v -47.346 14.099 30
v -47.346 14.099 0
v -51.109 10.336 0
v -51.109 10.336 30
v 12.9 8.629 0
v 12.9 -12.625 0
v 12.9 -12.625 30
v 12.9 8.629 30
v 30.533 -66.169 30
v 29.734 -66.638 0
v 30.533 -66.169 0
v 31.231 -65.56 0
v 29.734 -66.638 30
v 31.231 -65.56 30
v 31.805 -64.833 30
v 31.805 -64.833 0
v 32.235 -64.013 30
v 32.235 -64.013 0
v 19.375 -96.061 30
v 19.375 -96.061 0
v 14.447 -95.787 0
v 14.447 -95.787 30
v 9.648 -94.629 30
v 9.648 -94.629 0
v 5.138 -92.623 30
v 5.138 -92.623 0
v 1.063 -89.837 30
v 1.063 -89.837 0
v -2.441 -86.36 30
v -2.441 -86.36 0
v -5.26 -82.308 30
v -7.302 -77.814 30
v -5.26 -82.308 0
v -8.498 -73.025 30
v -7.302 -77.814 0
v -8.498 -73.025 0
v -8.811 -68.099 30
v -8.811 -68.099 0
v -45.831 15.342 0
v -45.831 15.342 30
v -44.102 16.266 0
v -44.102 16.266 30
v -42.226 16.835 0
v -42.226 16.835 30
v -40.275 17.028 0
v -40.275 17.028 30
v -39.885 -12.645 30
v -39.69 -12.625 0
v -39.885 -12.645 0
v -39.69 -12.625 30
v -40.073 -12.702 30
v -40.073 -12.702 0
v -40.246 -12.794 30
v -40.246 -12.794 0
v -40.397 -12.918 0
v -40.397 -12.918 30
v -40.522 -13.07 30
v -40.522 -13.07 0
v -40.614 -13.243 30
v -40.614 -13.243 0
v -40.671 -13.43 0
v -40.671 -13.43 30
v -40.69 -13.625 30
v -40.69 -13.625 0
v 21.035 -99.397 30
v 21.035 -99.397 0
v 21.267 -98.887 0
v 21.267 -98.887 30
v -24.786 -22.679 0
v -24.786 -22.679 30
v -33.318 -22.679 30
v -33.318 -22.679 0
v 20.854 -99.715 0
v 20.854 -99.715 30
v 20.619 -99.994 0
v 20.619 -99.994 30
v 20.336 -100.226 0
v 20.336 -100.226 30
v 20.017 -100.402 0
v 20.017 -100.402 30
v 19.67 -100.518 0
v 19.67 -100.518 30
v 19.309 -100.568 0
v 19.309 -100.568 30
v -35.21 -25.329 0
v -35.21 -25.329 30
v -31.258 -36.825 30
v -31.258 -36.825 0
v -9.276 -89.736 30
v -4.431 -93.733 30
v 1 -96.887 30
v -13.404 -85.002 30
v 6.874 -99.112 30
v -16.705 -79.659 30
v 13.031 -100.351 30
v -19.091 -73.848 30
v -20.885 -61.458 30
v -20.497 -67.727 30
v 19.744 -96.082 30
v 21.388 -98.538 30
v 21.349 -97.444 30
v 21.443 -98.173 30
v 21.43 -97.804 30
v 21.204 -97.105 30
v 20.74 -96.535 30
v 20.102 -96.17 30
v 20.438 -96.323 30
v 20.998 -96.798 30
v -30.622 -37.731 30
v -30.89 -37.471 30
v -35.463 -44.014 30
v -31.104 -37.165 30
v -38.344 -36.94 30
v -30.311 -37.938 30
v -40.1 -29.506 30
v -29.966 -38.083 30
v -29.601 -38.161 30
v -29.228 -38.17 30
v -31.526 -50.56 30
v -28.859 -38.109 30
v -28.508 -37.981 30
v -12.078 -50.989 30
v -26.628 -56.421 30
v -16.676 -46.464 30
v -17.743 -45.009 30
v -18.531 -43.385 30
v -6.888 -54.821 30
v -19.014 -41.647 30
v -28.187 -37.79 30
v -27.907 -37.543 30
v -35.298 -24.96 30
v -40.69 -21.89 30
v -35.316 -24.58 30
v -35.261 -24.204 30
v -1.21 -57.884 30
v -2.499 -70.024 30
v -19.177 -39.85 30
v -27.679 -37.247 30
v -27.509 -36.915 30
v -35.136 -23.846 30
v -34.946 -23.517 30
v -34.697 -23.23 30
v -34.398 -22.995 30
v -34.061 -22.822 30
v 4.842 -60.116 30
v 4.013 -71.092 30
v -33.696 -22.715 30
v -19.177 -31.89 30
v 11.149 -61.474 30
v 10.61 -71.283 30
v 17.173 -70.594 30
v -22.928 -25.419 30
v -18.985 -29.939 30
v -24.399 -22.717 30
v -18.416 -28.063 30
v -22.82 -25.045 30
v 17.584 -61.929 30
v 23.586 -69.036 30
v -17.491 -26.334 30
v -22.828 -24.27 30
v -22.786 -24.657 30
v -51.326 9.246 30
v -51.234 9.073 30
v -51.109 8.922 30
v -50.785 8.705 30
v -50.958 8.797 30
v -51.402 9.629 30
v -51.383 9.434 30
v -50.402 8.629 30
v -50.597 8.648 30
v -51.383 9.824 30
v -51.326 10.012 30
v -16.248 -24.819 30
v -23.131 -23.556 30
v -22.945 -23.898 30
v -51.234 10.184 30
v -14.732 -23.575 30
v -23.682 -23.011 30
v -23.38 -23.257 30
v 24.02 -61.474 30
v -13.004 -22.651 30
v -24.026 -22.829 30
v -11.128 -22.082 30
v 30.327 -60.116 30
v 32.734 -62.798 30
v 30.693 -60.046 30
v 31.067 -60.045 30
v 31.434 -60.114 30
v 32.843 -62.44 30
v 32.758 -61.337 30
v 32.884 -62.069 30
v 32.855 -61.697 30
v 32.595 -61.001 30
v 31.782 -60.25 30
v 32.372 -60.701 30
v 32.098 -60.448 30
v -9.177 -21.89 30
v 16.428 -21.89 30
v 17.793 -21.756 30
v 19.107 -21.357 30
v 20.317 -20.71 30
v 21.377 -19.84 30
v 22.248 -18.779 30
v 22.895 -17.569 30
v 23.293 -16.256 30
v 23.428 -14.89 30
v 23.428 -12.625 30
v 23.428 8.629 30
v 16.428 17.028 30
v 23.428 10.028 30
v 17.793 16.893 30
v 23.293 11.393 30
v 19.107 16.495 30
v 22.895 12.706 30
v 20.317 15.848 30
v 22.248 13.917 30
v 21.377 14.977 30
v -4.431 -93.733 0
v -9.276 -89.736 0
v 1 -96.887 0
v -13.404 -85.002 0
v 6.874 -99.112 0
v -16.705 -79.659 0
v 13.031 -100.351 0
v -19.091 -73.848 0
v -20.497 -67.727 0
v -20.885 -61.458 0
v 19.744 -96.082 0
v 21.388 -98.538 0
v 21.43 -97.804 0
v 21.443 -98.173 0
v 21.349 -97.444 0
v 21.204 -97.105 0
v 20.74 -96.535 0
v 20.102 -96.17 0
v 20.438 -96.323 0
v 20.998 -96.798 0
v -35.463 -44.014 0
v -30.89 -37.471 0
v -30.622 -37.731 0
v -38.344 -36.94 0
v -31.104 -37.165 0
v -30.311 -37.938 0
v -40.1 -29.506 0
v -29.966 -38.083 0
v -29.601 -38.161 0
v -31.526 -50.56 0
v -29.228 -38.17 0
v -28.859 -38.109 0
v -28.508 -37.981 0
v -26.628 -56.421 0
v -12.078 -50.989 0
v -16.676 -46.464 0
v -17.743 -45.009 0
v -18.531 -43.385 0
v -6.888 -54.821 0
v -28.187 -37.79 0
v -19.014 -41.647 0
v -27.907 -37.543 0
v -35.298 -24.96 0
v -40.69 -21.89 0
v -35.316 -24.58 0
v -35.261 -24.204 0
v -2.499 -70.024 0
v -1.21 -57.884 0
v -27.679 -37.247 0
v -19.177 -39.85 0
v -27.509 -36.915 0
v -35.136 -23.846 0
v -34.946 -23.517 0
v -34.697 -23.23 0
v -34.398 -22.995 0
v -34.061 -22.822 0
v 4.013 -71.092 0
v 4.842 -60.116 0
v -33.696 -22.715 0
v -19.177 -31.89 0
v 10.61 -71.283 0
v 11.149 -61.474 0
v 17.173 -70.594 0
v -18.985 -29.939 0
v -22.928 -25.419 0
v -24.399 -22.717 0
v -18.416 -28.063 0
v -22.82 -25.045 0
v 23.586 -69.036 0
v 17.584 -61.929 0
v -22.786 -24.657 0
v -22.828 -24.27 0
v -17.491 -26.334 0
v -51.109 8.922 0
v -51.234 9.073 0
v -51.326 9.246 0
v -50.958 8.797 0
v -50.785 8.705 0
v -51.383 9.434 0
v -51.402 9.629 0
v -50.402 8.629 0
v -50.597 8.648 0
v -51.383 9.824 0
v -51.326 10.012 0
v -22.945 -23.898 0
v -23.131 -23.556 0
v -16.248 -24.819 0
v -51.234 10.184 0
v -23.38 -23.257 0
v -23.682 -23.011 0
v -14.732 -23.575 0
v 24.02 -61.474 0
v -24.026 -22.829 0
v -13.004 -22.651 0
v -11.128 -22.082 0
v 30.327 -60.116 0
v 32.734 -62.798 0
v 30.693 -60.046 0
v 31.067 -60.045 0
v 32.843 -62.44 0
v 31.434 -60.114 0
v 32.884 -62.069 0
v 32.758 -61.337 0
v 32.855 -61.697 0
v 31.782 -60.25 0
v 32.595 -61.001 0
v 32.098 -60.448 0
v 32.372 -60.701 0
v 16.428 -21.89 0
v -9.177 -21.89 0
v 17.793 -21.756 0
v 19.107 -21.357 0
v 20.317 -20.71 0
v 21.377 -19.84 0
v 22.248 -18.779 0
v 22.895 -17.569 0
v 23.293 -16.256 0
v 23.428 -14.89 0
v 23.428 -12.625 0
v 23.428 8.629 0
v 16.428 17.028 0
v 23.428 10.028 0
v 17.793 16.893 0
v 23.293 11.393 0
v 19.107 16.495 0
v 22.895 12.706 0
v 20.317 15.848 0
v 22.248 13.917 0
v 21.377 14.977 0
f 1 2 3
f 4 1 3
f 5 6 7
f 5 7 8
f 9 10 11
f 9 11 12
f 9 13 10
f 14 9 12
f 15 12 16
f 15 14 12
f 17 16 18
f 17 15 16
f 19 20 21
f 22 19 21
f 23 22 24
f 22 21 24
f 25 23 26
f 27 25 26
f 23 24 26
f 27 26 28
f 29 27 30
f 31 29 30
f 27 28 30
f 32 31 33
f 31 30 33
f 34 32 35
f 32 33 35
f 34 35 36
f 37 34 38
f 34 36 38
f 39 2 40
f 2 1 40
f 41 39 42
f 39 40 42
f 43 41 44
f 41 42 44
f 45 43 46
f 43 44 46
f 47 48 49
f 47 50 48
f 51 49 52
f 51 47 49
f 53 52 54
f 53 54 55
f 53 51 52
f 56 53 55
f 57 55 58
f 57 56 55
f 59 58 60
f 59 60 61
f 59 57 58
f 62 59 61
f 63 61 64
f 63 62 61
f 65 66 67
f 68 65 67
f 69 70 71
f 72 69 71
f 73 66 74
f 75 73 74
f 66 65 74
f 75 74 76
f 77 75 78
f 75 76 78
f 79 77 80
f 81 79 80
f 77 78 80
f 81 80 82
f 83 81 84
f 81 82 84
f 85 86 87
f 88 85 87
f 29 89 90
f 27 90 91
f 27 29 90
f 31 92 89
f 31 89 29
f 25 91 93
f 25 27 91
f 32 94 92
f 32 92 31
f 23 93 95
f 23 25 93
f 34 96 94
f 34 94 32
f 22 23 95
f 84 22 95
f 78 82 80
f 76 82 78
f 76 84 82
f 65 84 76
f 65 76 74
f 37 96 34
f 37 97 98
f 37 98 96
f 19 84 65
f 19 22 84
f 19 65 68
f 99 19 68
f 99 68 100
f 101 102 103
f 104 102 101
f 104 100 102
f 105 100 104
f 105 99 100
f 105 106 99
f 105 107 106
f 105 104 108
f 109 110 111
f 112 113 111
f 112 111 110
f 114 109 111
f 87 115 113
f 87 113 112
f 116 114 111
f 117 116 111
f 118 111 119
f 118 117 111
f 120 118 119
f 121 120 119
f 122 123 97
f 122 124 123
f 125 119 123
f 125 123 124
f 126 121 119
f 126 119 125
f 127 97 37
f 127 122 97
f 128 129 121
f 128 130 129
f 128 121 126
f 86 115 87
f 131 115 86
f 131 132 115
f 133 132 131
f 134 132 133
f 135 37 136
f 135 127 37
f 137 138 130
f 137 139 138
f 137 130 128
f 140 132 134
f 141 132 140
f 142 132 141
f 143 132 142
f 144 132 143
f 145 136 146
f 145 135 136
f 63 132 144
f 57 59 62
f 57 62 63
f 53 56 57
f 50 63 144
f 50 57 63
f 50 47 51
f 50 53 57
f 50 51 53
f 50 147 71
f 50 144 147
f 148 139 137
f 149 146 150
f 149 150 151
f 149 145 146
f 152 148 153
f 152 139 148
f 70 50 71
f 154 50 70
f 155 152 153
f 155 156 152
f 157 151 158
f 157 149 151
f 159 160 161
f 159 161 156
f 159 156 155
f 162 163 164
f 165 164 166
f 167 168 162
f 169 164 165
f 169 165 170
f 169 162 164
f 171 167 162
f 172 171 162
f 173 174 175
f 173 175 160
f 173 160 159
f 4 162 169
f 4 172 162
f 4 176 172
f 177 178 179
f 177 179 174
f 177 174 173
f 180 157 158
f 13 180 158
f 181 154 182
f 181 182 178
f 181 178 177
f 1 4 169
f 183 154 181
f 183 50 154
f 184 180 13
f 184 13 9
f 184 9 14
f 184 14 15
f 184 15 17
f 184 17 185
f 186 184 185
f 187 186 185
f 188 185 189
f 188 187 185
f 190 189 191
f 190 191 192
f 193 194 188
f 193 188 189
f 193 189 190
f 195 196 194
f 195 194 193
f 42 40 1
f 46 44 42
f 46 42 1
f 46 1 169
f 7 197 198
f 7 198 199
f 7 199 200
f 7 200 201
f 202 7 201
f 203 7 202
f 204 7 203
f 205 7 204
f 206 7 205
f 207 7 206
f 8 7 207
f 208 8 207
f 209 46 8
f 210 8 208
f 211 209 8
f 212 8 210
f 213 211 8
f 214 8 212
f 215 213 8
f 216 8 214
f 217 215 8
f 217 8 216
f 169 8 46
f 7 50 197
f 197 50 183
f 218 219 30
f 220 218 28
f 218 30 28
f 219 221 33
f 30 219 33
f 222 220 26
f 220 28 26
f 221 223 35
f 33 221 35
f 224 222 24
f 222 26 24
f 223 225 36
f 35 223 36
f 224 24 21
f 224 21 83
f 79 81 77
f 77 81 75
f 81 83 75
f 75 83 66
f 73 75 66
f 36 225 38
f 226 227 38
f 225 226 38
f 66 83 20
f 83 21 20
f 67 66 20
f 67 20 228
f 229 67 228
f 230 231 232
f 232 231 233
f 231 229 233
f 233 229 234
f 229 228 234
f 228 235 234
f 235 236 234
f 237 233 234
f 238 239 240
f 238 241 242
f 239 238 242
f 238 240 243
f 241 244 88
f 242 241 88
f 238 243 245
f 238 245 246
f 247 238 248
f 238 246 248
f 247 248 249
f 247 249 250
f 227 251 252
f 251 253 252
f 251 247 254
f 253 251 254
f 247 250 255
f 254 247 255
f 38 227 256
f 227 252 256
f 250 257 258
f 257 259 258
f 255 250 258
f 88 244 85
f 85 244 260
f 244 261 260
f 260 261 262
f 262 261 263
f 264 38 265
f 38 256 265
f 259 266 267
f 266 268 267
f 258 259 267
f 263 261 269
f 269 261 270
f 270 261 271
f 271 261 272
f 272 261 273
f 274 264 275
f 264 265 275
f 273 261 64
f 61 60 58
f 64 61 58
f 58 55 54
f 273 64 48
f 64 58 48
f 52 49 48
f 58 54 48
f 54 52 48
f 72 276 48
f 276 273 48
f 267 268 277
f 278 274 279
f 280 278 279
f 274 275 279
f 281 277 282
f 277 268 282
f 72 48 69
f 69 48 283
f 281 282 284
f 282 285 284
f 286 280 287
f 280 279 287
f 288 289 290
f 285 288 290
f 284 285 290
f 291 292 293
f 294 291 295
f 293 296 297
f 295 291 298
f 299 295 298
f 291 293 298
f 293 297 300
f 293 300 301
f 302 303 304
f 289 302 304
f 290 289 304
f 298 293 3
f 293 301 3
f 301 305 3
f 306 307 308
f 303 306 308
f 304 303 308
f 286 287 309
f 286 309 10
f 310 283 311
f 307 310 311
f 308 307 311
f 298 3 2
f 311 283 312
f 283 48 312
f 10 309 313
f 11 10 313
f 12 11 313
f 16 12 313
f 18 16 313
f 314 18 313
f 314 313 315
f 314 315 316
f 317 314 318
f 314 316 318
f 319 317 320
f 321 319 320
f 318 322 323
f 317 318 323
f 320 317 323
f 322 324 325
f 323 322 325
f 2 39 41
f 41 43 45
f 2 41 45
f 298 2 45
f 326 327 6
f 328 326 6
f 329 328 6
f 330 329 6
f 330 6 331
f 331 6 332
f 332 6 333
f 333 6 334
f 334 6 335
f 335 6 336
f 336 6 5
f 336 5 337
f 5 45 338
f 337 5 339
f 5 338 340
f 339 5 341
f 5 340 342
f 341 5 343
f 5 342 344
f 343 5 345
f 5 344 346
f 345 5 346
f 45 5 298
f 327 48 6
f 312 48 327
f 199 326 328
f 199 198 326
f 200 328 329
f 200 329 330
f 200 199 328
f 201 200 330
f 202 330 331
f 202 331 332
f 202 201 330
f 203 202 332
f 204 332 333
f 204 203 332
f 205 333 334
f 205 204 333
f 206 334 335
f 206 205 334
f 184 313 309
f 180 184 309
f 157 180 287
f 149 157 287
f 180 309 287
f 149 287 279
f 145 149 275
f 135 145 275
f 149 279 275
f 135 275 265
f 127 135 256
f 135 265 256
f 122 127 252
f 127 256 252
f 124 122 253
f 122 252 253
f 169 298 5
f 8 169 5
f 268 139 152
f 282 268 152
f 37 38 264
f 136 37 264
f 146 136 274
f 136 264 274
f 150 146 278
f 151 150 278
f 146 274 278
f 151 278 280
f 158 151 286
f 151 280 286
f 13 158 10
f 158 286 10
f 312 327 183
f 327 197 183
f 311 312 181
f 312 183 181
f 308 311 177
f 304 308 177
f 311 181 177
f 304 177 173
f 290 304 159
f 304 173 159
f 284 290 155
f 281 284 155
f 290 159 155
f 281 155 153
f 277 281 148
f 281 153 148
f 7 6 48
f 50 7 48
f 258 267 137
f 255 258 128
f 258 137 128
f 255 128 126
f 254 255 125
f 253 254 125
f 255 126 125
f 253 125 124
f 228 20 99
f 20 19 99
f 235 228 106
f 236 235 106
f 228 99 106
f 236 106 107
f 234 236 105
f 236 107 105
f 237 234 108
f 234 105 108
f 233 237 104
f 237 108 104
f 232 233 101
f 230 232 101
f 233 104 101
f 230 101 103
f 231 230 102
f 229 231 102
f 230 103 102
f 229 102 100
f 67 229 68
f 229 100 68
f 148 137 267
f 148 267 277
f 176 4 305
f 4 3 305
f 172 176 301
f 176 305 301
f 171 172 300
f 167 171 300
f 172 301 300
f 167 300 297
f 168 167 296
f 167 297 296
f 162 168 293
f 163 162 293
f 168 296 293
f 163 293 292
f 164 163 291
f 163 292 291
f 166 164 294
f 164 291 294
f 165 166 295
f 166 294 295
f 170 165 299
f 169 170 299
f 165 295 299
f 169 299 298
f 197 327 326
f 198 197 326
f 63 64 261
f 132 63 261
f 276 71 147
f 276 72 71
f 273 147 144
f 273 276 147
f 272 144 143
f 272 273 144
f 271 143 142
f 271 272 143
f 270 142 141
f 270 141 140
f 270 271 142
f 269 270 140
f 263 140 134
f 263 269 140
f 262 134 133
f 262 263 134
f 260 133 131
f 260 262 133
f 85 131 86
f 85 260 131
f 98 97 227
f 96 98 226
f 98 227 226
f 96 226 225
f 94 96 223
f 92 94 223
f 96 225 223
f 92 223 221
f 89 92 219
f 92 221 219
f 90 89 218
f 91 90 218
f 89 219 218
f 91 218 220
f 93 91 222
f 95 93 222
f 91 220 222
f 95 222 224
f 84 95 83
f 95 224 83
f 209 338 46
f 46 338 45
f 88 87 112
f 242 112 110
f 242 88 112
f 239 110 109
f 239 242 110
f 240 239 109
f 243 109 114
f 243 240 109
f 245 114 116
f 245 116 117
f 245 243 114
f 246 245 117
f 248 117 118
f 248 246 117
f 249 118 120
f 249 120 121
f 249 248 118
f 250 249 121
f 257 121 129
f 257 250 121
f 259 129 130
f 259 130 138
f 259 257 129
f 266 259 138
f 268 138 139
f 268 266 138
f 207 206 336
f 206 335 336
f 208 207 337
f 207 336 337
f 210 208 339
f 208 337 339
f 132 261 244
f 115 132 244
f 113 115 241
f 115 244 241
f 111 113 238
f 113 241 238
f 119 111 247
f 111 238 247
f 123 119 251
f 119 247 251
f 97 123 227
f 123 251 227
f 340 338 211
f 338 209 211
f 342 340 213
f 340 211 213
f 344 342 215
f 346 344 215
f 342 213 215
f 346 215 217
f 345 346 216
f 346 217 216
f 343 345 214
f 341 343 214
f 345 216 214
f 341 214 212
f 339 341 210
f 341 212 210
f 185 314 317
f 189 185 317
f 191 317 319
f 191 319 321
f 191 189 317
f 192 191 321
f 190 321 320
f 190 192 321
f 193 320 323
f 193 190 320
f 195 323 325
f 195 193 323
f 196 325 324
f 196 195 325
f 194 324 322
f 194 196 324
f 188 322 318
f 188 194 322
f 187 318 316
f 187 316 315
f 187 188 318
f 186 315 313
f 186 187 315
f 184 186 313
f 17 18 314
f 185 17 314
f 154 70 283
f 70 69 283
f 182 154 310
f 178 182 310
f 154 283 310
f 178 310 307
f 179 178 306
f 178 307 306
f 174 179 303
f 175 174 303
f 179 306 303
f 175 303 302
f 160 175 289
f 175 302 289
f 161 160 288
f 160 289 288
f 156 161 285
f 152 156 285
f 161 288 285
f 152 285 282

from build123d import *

# Parameters (mm, degrees)
F0_W        = 10.5280357461
F0_H        = 21.2543252856
F1_DEPTH    = 30
F2_R        = 5
F3_R        = 2
F4_R        = 2
F5_R        = 2
F6_R        = 7
F7_T1_DEPTH = 81.4336597593
F8_R        = 10
F9_R        = 1
F10_R       = 10
F11_R       = 10
F13_DEPTH   = 30
F14_R       = 2


# Not quite as in the source:
# - a fillet or chamfer that OpenCascade refuses, or shapes differently, is made with other operations: its cross-section is extruded or revolved along the edge and cut away or added


with BuildPart() as f1:
    # F0 (on Top) → F1 (new body)
    with BuildSketch(Plane.XY):
        Polygon((23.4277165425, 17.0276444405), (-54.4175144403, 17.0276444405), (-54.4175144403, 8.6288927123), (12.8996807964, 8.6288927123), (23.4277165425, 8.6288927123), align=None)
        with Locations((18.1636986695, -1.9982699305)):
            Rectangle(F0_W, F0_H)
        Polygon((23.4277165425, -21.8901360014), (23.4277165425, -12.6254325733), (12.8996807964, -12.6254325733), (-40.6902853517, -12.6254325733), (-40.6902853517, -21.8901360014), (-27.7488247443, -21.8901360014), (-19.1767220313, -21.8901360014), align=None)
        with BuildLine():
            Line((-19.1767220313, -43.3673763092), (-19.1767220313, -21.8901360014))
            Line((-19.1767220313, -21.8901360014), (-27.7488247443, -21.8901360014))
            ThreePointArc((-27.7488247443, -21.8901360014), (-24.844212154, -33.1801228498), (-19.1767220313, -43.3673763092))
        make_face()
        with BuildLine():
            Line((-27.7488247443, -21.8901360014), (-40.6902853517, -21.8901360014))
            ThreePointArc((-40.6902853517, -21.8901360014), (-35.4626283769, -44.0139601174), (-20.8854291365, -61.4580781309))
            ThreePointArc((-20.8854291365, -61.4580781309), (-15.0806794225, -65.2011539101), (-8.8108392586, -68.098538912))
            ThreePointArc((-8.8108392586, -68.098538912), (11.6035028188, -71.235670703), (31.5175838768, -65.7569542527))
            Line((31.5175838768, -65.7569542527), (34.4113459094, -58.7176481952))
            ThreePointArc((34.4113459094, -58.7176481952), (5.0047282318, -60.1630877212), (-19.1767220313, -43.3673763092))
            ThreePointArc((-19.1767220313, -43.3673763092), (-24.844212154, -33.1801228498), (-27.7488247443, -21.8901360014))
        make_face()
        with BuildLine():
            ThreePointArc((-8.8108392586, -68.098538912), (-15.0806794225, -65.2011539101), (-20.8854291365, -61.4580781309))
            ThreePointArc((-20.8854291365, -61.4580781309), (-8.8309401238, -90.1622048174), (20.5386656224, -100.4900241667))
            Line((20.5386656224, -100.4900241667), (22.6970568086, -95.7385333169))
            ThreePointArc((22.6970568086, -95.7385333169), (0.4530333538, -89.3168234963), (-8.8108392586, -68.098538912))
        make_face()
    extrude(amount=F1_DEPTH)

    # F2
    f2_edges = [f1.edges().sort_by_distance(p)[0] for p in [
        (31.517584, -65.756954, 15),
    ]]
    fillet(f2_edges, radius=F2_R)

    # F3
    f3_edges = [f1.edges().sort_by_distance(p)[0] for p in [
        (34.411346, -58.717648, 15),
    ]]
    fillet(f3_edges, radius=F3_R)

    # F4
    f4_edges = [f1.edges().sort_by_distance(p)[0] for p in [
        (22.697057, -95.738533, 15),
    ]]
    fillet(f4_edges, radius=F4_R)

    # F5
    f5_edges = [f1.edges().sort_by_distance(p)[0] for p in [
        (20.538666, -100.490024, 15),
    ]]
    fillet(f5_edges, radius=F5_R)

    # F6
    f6_edges = [f1.edges().sort_by_distance(p)[0] for p in [
        (23.427717, -21.890136, 15),
        (23.427717, 17.027644, 15),
    ]]
    fillet(f6_edges, radius=F6_R)

    # F7: chamfer of 10 on 1 edges, made by hand

    # F7_s2 → F7_t1 (cut)
    with BuildSketch(Plane.XY.offset(-25.7168298797)):
        Polygon((-44.4175144403, 17.0276444405), (-54.4175144403, 7.0276444405), (-54.4175144403, 17.0276444405), align=None)
    extrude(amount=F7_T1_DEPTH, mode=Mode.SUBTRACT)

    # F8
    f8_edges = [f1.edges().sort_by_distance(p)[0] for p in [
        (-44.417514, 17.027644, 15),
    ]]
    fillet(f8_edges, radius=F8_R)

    # F9
    f9_edges = [f1.edges().sort_by_distance(p)[0] for p in [
        (-52.816266, 8.628893, 15),
        (-40.690285, -12.625433, 15),
    ]]
    fillet(f9_edges, radius=F9_R)

    # F10
    f10_edges = [f1.edges().sort_by_distance(p)[0] for p in [
        (-19.176722, -21.890136, 15),
    ]]
    fillet(f10_edges, radius=F10_R)

    # F11
    f11_edges = [f1.edges().sort_by_distance(p)[0] for p in [
        (-19.176722, -43.367376, 15),
    ]]
    fillet(f11_edges, radius=F11_R)

    # F12 (on face) → F13 (cut)
    with BuildSketch(Plane.XY.offset(30)):
        Polygon((-21.8362864107, -22.6786807179), (-36.1205674708, -22.6786807179), (-29.5046903193, -41.924867779), align=None)
    extrude(amount=-F13_DEPTH, mode=Mode.SUBTRACT)

    # F14
    f14_edges = [f1.edges().sort_by_distance(p)[0] for p in [
        (-21.836286, -22.678681, 15),
        (-36.120567, -22.678681, 15),
        (-29.50469, -41.924868, 15),
    ]]
    fillet(f14_edges, radius=F14_R)


solid = f1.part
